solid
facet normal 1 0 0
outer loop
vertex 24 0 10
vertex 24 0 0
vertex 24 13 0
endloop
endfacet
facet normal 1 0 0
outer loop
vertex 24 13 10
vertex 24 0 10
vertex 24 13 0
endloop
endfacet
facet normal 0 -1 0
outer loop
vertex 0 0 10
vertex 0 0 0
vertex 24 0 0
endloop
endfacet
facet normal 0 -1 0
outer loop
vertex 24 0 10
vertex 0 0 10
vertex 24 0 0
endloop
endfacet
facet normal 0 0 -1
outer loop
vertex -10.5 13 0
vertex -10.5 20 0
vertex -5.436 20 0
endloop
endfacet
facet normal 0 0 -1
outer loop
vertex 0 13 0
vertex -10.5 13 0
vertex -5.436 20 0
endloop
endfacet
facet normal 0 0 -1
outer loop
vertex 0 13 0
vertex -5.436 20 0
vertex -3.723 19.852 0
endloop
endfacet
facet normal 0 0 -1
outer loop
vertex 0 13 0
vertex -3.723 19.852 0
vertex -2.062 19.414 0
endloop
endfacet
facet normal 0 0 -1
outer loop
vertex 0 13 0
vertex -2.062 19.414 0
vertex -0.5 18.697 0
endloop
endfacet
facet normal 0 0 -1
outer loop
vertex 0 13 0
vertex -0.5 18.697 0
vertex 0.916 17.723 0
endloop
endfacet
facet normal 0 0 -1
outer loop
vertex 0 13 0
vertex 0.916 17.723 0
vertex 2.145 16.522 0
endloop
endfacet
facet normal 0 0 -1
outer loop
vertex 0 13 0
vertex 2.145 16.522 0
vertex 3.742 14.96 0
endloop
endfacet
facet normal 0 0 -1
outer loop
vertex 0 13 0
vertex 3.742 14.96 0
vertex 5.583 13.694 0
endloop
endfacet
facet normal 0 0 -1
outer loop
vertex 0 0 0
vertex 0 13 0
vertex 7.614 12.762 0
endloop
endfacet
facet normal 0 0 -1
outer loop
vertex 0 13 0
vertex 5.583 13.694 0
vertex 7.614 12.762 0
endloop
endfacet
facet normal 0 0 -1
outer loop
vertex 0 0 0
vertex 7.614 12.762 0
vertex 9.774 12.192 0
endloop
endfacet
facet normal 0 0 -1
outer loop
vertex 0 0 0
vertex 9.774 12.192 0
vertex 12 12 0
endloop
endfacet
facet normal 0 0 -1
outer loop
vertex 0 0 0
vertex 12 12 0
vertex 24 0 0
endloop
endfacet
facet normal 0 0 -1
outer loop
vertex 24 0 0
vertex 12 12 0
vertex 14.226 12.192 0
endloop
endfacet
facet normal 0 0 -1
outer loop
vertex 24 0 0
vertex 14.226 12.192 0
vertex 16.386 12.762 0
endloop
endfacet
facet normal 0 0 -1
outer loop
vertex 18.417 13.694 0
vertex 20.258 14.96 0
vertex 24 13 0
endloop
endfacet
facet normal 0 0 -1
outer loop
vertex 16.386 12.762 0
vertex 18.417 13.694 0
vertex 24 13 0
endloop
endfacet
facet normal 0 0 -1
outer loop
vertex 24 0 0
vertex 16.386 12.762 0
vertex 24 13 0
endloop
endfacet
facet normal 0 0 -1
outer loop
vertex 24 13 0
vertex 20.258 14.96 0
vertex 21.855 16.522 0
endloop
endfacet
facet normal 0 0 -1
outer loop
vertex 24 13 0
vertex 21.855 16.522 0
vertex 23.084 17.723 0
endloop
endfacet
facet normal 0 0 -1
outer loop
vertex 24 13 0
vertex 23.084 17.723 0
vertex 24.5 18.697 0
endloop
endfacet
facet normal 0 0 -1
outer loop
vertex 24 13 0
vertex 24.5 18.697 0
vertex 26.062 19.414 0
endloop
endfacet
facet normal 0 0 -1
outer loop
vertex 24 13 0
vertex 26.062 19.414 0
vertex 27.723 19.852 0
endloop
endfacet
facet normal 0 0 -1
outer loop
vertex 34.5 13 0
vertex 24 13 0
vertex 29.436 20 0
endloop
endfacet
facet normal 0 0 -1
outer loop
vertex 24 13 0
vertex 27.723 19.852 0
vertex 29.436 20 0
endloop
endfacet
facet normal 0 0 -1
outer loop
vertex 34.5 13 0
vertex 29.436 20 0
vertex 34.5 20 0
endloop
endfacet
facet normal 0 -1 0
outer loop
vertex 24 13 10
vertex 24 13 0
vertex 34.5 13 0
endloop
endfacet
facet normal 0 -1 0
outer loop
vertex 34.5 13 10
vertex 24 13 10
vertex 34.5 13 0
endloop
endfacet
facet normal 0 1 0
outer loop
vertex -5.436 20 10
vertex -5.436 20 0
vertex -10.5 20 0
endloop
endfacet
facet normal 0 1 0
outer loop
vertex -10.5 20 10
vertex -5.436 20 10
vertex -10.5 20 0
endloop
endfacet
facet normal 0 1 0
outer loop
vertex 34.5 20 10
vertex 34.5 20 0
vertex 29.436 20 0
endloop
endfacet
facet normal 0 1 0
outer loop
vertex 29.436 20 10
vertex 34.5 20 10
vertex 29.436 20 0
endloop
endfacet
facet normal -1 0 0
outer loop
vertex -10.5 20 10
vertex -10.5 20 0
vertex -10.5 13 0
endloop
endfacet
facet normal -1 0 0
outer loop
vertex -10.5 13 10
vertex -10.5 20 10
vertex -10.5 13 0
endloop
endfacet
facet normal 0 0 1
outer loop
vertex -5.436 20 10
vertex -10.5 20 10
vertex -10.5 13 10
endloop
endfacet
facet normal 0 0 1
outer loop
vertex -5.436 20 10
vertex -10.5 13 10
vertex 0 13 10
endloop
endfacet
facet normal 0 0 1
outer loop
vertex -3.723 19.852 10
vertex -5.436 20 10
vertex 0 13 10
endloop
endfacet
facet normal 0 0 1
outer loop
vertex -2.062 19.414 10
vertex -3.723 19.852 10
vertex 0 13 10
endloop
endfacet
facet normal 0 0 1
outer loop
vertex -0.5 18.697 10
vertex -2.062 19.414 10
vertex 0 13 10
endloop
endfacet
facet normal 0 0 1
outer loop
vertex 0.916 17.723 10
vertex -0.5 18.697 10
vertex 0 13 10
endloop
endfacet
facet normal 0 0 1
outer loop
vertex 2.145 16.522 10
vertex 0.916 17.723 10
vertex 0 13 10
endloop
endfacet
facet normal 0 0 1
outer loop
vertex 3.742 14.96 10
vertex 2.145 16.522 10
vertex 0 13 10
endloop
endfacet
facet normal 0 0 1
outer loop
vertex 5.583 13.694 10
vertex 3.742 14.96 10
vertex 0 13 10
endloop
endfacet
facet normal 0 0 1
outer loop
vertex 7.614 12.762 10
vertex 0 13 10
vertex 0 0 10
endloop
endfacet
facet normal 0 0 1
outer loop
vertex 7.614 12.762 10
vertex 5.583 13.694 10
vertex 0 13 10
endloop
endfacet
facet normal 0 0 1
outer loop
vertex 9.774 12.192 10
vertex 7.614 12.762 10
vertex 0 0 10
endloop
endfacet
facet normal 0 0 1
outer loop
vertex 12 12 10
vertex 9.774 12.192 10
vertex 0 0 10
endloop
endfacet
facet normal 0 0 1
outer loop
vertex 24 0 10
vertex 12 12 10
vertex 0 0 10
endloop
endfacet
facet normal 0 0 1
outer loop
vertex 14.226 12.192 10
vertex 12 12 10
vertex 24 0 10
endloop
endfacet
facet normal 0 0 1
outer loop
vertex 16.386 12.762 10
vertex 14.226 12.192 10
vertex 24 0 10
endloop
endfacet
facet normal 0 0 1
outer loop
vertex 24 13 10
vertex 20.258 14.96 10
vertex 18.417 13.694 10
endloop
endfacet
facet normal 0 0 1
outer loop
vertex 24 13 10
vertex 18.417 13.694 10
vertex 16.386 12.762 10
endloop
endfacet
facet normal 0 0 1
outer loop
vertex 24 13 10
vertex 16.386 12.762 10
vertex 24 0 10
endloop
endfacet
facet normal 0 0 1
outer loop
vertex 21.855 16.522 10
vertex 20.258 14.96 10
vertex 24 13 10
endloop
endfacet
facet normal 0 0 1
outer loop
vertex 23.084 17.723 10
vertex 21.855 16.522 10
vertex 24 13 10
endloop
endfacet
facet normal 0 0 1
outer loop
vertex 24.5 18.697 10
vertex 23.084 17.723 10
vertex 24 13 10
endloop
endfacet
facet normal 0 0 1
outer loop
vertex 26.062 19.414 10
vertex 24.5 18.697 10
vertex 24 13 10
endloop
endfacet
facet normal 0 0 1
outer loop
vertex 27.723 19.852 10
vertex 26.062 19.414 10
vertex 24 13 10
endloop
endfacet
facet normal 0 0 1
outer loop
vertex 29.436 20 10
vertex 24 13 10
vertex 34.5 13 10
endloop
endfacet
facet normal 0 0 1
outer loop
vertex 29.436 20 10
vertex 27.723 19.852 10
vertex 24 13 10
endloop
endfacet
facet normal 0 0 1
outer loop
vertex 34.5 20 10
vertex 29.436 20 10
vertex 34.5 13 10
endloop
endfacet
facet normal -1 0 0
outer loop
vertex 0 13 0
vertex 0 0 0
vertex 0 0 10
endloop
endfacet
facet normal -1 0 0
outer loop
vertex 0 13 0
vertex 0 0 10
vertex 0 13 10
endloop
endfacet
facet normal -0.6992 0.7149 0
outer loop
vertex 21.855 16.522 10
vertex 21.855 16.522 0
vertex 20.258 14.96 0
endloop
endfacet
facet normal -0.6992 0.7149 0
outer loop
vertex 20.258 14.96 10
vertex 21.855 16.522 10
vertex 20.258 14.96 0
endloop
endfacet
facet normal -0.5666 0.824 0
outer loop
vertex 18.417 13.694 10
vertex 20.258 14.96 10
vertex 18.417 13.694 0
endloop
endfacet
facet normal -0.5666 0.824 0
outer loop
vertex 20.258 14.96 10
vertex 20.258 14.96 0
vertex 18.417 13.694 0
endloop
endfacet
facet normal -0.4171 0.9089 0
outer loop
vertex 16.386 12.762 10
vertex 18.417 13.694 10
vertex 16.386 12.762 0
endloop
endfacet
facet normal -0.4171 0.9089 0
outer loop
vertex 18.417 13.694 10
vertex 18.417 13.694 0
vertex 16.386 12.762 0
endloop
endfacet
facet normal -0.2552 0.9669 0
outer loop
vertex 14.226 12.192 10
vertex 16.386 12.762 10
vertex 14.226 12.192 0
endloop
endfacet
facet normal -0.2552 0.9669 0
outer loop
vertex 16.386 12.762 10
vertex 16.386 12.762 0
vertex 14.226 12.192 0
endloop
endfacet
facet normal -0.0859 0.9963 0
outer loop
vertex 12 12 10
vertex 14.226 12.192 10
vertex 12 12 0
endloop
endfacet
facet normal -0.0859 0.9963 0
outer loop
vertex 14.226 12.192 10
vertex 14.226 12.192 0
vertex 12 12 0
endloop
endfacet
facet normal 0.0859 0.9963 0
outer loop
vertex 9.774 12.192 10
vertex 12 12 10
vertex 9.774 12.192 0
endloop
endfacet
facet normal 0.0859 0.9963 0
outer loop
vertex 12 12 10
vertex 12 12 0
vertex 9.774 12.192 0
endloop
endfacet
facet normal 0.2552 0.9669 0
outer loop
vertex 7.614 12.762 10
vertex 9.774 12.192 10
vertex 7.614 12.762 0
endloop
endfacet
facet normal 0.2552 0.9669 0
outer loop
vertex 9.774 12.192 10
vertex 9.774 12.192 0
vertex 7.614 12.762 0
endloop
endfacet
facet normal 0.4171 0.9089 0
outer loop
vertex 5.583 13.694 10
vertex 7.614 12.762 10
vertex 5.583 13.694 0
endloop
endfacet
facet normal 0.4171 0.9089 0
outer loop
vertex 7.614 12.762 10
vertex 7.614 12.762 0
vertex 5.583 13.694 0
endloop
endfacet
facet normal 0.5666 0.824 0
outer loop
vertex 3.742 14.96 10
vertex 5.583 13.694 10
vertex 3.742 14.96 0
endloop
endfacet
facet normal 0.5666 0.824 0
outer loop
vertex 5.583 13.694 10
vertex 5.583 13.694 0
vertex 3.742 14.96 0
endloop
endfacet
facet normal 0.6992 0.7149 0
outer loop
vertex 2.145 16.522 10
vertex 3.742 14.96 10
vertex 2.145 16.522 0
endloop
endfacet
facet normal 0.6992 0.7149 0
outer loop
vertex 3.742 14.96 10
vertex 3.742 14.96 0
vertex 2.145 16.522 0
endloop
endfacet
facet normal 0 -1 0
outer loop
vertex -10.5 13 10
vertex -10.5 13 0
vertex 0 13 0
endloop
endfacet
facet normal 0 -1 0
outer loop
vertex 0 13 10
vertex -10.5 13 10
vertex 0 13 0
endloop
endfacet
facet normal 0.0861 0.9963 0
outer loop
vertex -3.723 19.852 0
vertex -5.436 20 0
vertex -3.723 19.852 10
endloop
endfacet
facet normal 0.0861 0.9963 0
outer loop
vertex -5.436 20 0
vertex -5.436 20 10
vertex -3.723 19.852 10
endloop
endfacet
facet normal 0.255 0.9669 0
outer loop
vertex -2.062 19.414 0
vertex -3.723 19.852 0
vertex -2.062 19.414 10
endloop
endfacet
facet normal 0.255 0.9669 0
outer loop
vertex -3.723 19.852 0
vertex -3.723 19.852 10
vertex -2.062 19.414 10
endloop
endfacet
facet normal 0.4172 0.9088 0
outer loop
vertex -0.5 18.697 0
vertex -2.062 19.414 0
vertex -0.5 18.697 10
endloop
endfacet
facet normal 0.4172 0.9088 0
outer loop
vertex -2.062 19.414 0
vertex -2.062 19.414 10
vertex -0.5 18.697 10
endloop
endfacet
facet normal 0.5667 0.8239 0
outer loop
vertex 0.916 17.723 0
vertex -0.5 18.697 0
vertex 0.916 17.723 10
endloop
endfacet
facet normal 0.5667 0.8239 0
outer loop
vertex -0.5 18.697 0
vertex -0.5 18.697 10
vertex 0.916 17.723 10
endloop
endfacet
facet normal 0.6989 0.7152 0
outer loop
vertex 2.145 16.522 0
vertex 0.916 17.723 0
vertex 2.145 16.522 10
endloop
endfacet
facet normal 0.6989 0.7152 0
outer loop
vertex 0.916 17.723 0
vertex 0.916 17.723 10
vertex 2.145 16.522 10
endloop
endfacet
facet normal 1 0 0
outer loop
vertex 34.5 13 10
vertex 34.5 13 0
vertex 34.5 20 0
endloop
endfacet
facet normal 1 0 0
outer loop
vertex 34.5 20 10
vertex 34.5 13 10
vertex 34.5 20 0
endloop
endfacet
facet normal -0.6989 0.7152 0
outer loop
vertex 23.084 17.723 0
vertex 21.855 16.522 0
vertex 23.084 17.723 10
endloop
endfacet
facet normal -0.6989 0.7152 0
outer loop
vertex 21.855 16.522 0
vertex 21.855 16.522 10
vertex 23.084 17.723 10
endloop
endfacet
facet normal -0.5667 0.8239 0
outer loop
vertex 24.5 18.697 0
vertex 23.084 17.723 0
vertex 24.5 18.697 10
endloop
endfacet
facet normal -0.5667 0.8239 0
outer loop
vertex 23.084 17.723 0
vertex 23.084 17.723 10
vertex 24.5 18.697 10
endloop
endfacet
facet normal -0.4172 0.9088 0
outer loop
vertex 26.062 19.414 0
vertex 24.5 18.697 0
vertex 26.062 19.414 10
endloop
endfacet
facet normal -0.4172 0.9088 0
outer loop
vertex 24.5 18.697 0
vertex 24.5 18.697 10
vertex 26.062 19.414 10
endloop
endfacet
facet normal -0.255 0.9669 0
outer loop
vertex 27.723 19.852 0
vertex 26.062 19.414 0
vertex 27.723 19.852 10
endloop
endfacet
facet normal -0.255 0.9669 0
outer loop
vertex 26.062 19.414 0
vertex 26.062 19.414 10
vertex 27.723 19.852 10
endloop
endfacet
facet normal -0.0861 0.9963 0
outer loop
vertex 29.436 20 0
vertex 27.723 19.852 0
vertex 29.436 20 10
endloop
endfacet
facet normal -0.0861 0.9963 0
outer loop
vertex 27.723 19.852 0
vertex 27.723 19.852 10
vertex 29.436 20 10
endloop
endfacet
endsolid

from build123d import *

# Parameters (mm, degrees)
SKETCH1_W           = 24
SKETCH1_H           = 13
BOSS_EXTRUDE1_DEPTH = 10
CUT_EXTRUDE2_DEPTH  = 11
FILLET1_R           = 10


with BuildPart() as part:
    # Sketch1 → Boss-Extrude1 (new body)
    with BuildSketch(Plane.XY):
        with Locations((12, 6.5)):
            Rectangle(SKETCH1_W, SKETCH1_H)
        Polygon((24, 13), (34.5, 13), (34.5, 20), (-10.5, 20), (-10.5, 13), (0, 13), align=None)
    extrude(amount=BOSS_EXTRUDE1_DEPTH)

    # Sketch2 → Cut-Extrude2 (cut, through all)
    with BuildSketch(Plane(origin=(0, 0, 0), x_dir=(-1, 0, 0), z_dir=(0, 0, -1))):
        with BuildLine():
            Line((0, 20), (-24, 20))
            ThreePointArc((-24, 20), (-12, 12), (0, 20))
        make_face()
    extrude(amount=-CUT_EXTRUDE2_DEPTH, mode=Mode.SUBTRACT)

    # Fillet1
    fillet1_edges = [part.edges().sort_by_distance(p)[0] for p in [
        (0, 20, 5),
        (24, 20, 5),
    ]]
    fillet(fillet1_edges, radius=FILLET1_R)


solid = part.part
